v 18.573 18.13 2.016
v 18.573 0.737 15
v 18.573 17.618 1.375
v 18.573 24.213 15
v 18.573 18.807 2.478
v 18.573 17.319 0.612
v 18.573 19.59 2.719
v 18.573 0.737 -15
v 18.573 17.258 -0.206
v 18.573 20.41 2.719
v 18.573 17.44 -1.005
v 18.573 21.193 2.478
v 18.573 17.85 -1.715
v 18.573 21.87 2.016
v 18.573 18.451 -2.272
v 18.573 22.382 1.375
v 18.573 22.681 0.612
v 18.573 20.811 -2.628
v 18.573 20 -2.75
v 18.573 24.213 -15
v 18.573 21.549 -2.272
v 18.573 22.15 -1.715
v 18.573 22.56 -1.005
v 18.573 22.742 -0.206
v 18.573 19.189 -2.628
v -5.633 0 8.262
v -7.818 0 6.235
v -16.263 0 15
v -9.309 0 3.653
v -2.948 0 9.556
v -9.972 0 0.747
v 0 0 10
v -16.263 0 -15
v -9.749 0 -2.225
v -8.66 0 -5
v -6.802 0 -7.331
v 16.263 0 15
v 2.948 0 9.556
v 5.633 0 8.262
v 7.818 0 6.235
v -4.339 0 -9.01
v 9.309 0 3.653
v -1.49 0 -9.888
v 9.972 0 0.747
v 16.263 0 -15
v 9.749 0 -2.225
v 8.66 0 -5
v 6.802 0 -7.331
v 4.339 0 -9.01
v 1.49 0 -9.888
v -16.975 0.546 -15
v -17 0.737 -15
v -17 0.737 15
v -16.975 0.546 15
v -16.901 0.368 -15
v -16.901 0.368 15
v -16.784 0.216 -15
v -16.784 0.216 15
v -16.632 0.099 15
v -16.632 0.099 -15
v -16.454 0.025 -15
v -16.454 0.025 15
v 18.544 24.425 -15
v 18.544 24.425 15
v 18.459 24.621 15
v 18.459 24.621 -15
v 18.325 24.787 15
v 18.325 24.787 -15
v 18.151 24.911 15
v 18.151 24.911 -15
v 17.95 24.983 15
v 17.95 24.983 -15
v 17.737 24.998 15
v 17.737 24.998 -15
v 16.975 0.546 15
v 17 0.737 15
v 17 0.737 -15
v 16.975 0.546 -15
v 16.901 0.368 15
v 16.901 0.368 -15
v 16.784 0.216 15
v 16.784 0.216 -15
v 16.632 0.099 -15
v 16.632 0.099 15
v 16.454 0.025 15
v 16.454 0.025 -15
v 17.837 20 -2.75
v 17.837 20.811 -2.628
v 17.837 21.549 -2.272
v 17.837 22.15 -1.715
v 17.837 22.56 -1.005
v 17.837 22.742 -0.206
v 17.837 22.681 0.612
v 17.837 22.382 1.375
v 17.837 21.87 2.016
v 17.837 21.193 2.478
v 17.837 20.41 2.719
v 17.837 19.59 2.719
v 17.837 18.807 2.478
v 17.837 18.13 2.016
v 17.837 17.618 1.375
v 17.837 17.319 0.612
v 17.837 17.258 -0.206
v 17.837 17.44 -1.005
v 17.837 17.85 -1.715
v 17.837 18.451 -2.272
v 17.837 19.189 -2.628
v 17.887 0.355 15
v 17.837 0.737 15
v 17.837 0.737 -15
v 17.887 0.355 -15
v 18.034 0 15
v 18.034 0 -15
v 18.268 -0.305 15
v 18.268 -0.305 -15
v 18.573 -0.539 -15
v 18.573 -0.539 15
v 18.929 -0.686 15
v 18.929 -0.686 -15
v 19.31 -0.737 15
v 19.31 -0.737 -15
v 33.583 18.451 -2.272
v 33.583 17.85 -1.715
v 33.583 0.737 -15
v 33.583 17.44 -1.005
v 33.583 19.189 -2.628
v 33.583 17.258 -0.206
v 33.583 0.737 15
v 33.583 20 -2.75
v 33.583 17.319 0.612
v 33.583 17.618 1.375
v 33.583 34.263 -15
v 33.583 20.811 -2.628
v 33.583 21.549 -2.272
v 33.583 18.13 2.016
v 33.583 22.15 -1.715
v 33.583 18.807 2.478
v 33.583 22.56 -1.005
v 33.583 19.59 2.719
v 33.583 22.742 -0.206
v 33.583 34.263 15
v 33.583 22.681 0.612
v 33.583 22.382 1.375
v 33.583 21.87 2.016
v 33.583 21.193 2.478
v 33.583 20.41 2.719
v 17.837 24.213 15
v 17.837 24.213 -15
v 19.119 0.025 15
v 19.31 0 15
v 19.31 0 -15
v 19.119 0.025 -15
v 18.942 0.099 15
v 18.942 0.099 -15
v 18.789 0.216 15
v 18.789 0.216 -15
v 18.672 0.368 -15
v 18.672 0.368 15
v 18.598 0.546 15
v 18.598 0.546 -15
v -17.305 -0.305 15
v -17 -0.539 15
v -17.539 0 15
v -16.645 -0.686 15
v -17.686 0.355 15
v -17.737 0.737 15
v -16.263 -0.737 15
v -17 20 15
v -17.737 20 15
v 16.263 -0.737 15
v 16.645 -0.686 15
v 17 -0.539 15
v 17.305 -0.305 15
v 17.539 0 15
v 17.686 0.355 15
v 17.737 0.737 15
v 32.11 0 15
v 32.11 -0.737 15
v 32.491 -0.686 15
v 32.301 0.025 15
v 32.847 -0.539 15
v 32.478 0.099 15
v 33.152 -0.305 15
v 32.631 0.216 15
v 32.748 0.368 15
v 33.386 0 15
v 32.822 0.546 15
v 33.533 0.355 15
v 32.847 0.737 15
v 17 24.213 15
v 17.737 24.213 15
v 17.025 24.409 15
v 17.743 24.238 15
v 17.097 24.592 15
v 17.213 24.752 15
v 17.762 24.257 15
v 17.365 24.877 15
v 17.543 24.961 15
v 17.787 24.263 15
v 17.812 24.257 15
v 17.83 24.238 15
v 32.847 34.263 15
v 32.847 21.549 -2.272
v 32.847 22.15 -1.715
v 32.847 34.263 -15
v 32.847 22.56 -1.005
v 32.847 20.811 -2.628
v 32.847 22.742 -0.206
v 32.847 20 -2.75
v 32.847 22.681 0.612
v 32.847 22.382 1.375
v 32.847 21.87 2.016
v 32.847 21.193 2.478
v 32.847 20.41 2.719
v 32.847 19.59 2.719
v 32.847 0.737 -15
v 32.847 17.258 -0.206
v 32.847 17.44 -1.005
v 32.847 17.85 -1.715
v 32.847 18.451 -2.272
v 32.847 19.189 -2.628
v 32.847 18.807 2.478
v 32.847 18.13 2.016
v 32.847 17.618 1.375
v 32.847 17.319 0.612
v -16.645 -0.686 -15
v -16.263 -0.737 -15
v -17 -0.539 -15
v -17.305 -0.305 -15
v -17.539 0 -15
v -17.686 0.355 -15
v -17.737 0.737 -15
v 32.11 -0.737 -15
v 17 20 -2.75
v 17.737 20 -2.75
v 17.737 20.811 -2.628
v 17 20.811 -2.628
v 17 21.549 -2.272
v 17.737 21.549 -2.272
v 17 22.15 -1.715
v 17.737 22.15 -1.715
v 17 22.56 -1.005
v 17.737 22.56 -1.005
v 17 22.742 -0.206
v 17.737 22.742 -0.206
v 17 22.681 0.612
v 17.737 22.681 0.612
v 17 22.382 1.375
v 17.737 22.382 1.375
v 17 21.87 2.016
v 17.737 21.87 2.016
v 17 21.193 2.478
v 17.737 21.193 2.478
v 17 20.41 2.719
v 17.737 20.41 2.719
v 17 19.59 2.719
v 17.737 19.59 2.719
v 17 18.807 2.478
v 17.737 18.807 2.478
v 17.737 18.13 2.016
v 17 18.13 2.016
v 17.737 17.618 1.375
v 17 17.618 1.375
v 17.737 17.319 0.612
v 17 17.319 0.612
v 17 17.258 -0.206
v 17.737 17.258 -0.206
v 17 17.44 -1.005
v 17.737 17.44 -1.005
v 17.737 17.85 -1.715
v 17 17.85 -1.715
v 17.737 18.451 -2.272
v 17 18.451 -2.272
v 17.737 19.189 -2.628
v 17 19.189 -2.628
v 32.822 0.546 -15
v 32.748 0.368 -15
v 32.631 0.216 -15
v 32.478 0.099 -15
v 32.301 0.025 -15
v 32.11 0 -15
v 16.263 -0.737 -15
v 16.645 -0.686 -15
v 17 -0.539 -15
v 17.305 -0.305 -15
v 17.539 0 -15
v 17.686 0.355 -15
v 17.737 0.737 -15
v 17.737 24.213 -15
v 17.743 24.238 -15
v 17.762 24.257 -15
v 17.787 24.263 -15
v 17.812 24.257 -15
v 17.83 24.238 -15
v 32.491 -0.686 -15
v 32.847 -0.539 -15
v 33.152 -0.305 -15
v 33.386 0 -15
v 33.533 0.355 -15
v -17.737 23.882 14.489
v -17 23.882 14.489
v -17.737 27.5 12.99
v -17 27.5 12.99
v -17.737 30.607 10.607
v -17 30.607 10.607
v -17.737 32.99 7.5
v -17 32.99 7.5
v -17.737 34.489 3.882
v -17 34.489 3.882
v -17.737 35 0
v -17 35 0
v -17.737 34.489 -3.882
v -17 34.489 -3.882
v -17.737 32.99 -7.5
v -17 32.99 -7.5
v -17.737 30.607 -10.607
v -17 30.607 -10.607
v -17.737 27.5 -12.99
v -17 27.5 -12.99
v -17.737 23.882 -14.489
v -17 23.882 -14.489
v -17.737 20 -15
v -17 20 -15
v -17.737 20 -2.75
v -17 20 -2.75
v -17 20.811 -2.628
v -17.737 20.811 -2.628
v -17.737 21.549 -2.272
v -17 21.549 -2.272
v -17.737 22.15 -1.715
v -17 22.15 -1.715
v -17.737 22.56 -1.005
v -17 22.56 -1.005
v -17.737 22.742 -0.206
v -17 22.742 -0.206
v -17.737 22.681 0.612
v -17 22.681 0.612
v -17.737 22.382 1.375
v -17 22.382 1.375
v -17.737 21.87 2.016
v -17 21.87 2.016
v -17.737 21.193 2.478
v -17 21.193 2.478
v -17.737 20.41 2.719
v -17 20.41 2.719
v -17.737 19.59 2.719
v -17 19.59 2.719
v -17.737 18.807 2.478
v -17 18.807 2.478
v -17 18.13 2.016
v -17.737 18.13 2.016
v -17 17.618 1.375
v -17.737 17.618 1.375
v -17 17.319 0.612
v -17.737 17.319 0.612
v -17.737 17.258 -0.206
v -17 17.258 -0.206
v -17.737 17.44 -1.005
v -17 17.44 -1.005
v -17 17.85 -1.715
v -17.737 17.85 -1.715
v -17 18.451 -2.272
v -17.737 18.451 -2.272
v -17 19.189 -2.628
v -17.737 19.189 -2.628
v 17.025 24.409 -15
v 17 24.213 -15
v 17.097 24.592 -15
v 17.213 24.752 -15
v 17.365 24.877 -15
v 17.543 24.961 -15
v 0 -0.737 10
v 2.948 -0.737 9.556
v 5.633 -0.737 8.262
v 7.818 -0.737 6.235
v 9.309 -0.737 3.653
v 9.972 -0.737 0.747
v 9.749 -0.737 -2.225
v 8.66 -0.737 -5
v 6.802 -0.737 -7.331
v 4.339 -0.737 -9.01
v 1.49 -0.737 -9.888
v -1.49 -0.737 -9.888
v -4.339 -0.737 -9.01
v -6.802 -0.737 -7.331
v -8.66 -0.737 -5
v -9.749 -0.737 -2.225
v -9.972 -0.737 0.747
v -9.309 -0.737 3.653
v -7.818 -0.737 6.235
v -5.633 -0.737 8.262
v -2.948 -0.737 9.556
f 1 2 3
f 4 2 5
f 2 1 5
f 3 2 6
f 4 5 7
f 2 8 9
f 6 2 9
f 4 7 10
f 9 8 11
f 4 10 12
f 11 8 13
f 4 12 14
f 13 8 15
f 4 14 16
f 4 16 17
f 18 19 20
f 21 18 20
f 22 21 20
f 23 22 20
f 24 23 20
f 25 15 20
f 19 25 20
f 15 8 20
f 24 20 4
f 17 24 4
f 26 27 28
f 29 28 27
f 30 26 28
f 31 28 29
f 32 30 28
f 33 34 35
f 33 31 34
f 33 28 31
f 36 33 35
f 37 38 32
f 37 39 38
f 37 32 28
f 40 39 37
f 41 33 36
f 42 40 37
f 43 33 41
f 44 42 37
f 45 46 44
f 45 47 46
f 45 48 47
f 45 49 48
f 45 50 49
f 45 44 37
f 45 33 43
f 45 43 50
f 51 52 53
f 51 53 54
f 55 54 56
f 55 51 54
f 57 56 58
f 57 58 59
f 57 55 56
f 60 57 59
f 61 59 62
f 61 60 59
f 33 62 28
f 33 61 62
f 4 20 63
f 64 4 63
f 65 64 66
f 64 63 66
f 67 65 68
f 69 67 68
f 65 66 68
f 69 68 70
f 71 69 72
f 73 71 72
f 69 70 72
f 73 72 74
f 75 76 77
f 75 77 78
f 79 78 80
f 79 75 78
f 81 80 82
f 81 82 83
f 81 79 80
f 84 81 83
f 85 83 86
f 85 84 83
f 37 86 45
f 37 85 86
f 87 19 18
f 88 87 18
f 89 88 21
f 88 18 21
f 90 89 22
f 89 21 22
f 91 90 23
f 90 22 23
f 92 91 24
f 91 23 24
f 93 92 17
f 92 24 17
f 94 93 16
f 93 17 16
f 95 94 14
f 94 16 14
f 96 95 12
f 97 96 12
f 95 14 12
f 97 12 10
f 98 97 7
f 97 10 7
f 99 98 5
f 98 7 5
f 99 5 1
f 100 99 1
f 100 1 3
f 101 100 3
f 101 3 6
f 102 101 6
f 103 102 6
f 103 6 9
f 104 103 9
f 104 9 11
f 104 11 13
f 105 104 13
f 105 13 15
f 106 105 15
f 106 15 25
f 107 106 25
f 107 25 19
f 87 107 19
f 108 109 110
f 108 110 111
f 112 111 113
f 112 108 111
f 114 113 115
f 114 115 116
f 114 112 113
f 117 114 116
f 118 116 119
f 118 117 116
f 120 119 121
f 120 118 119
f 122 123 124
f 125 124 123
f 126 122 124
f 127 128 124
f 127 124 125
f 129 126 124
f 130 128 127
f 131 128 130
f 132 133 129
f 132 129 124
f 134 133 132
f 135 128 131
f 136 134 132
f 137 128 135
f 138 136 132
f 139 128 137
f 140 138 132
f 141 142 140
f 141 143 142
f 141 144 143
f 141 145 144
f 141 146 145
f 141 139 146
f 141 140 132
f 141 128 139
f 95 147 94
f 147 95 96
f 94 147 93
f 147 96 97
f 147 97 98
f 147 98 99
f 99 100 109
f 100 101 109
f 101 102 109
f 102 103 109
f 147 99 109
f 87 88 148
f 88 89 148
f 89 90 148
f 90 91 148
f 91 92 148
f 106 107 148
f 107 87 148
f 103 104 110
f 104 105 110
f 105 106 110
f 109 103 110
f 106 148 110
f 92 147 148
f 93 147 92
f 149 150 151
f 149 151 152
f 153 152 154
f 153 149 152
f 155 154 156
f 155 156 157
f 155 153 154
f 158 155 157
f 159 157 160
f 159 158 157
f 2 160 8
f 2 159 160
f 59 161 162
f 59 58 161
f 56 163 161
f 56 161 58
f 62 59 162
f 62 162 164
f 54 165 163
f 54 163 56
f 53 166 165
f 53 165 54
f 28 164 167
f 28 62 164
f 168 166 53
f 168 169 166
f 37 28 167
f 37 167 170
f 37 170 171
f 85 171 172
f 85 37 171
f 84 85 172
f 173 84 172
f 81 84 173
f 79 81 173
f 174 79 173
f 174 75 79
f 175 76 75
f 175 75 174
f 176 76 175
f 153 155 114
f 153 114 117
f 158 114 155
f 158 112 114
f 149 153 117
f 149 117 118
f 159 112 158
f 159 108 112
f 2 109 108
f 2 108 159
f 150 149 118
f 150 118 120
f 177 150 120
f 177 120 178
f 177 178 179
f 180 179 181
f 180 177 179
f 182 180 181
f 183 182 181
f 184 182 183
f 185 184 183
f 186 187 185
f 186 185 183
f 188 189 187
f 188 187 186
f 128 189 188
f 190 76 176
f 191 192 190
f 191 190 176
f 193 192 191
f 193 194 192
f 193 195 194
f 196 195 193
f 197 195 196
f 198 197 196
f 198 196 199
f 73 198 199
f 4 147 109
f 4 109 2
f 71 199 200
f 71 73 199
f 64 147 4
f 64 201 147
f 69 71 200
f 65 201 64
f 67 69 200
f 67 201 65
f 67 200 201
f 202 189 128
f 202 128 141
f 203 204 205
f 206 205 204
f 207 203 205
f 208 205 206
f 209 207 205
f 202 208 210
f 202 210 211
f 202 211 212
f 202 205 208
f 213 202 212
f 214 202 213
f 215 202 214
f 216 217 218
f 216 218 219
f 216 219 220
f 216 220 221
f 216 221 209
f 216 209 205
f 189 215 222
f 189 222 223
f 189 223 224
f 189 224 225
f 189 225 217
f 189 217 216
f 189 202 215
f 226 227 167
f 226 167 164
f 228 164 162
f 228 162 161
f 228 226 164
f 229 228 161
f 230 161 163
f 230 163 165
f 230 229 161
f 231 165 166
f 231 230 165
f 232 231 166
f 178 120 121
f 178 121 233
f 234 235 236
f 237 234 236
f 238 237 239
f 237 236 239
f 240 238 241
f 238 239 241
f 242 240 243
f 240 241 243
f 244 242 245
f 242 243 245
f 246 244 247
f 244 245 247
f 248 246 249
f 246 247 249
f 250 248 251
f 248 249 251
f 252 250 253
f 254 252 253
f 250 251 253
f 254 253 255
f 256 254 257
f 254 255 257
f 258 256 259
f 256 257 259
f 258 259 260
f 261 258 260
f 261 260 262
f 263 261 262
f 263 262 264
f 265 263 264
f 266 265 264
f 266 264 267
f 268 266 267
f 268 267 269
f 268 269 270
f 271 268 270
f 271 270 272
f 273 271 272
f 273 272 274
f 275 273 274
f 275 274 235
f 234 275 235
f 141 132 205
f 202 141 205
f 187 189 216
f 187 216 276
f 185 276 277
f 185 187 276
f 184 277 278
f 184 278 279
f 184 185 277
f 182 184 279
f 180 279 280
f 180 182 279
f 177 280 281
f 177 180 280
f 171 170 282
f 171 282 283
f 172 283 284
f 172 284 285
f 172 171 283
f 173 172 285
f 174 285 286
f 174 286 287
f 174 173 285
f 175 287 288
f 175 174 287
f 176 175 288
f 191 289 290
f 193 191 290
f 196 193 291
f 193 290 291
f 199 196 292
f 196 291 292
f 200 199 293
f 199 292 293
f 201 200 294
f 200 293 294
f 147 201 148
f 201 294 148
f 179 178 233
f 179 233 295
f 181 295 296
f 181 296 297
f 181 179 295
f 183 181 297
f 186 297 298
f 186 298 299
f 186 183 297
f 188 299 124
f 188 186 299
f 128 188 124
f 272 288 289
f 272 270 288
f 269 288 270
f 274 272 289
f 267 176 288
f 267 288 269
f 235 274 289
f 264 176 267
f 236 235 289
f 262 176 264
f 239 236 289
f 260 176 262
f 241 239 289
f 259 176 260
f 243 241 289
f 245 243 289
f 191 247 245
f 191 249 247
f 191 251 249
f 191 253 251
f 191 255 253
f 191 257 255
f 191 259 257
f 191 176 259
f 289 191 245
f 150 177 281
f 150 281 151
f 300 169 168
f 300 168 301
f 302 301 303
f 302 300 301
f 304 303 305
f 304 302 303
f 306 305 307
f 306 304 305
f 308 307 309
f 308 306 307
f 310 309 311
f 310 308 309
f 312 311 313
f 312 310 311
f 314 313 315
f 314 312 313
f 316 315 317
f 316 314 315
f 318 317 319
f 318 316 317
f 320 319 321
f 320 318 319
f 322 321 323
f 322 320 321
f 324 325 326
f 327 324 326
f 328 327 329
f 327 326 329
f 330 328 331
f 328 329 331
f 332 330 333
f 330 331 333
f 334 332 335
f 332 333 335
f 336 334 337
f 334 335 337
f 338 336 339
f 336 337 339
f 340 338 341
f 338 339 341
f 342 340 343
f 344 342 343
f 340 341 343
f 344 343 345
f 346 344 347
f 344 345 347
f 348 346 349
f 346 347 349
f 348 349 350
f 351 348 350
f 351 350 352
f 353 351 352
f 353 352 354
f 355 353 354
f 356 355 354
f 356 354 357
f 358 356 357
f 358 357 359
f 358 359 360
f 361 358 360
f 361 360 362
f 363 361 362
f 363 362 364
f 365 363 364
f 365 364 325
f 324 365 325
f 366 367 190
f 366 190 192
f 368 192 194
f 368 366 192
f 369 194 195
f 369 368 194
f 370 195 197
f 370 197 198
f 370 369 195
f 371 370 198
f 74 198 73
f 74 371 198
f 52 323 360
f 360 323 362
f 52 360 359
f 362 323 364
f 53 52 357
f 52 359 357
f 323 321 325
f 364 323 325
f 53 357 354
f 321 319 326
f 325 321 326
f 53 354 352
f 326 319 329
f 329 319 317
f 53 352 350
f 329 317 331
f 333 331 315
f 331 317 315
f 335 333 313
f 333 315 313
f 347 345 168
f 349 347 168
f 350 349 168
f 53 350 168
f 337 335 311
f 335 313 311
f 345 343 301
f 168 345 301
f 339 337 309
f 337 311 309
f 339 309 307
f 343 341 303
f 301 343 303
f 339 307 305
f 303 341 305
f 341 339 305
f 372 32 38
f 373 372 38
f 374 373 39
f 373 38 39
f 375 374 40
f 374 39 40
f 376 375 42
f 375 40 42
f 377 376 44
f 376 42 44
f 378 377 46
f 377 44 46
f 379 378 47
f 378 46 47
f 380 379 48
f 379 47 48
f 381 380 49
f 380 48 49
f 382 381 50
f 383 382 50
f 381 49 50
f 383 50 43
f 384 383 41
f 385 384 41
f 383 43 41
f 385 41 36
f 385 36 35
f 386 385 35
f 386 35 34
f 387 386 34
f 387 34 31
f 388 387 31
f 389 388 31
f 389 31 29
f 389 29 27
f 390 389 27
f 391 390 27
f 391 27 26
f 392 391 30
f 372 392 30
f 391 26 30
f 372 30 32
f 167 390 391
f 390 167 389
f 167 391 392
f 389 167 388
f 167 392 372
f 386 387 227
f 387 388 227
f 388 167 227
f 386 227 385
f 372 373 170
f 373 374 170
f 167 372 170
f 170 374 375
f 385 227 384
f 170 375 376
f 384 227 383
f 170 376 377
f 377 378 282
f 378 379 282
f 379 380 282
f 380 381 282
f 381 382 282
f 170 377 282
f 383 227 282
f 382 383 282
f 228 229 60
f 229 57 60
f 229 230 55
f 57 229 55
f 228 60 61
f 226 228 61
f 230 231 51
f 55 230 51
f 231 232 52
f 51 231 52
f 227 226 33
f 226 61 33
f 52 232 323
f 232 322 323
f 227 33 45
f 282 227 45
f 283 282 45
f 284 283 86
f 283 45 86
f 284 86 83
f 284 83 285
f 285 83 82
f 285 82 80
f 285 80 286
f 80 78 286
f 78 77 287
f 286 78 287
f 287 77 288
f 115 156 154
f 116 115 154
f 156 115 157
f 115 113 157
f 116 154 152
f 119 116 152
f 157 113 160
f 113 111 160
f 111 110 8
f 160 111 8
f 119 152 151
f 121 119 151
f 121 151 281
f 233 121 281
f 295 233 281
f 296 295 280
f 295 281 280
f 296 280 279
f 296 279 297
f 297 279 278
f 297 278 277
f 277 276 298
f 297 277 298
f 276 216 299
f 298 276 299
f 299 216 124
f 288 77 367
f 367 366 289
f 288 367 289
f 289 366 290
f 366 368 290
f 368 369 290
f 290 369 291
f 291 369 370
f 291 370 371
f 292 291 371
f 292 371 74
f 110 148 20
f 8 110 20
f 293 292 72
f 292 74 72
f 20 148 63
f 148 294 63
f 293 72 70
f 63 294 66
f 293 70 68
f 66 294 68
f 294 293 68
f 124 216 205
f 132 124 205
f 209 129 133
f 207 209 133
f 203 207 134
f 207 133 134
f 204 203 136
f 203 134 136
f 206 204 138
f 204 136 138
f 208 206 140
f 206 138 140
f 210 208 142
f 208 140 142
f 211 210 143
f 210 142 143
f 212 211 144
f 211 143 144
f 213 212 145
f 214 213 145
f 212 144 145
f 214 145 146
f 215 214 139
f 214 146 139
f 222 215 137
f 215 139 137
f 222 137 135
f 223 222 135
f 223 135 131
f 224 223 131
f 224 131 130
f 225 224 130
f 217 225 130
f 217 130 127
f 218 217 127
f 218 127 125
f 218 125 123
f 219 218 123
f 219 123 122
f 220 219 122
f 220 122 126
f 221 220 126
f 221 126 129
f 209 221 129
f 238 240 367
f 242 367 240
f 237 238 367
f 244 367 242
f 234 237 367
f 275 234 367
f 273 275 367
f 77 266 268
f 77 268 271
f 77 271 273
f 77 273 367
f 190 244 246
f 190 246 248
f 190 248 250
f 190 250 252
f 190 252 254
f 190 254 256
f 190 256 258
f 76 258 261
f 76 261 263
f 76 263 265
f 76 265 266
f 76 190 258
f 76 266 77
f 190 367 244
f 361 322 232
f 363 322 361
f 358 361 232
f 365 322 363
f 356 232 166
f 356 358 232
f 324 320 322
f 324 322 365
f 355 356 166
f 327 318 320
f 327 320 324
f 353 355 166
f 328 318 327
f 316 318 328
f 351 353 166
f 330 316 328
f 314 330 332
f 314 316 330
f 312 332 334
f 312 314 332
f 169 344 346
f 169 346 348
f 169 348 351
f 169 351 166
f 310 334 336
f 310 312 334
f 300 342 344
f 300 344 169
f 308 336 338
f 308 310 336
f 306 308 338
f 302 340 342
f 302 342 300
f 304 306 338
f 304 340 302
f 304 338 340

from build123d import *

# Parameters (mm, degrees)
SKETCH1_W                    = 34
SKETCH1_H                    = 30
SKETCH1_R                    = 10
BASE_FLANGE1_DEPTH           = 0.7366
EDGE_FLANGE1_STRIP_W         = 4.4196
EDGE_FLANGE1_STRIP_H         = 0.7366
EDGE_FLANGE1_STRIP_CUT_DEPTH = 30
EDGE_FLANGE1_DEPTH           = 30
EDGE_FLANGE2_STRIP_W         = 4.4196
EDGE_FLANGE2_STRIP_H         = 0.7366
EDGE_FLANGE2_STRIP_CUT_DEPTH = 30
EDGE_FLANGE2_DEPTH           = 30
EDGE_FLANGE2_START           = 0.7366
EDGE_FLANGE2_FLAT_DEPTH      = 0.7366
HEM1_START                   = -15
HEM1_DEPTH                   = 30
HEM1_2_DEPTH                 = 30
EDGE_FLANGE3_STRIP_W         = 4.4196
EDGE_FLANGE3_STRIP_H         = 0.7366
EDGE_FLANGE3_STRIP_CUT_DEPTH = 30
EDGE_FLANGE3_DEPTH           = 30
EDGE_FLANGE4_STRIP_W         = 4.4196
EDGE_FLANGE4_STRIP_H         = 0.7366
EDGE_FLANGE4_STRIP_CUT_DEPTH = 30
EDGE_FLANGE4_DEPTH           = 30
F_5_5_5_5_DIAMETER_HOLE1_D   = 5.5


# Read off the part's stored shape, not the designer's step: Hem1
# Sheet-metal steps are written as plain solids
with BuildPart() as part:
    # Sketch1 → Base-Flange1 (new body)
    with BuildSketch(Plane(origin=(0, 0, 0), x_dir=(1, 0, 0), z_dir=(0, 1, 0))):
        Rectangle(SKETCH1_W, SKETCH1_H)
        with Locations(Location((0, 0, 0), (0, 0, 270))):
            Circle(SKETCH1_R, mode=Mode.SUBTRACT)
    extrude(amount=-BASE_FLANGE1_DEPTH)

    # Edge-Flange1 strip (across the edge) → Edge-Flange1 strip cut (cut)
    with BuildSketch(Plane(origin=(17, 0, 15), x_dir=(-1, 0, 0), z_dir=(0, 0, -1))):
        with Locations((-1.4732, -0.3683)):
            Rectangle(EDGE_FLANGE1_STRIP_W, EDGE_FLANGE1_STRIP_H)
    extrude(amount=EDGE_FLANGE1_STRIP_CUT_DEPTH, mode=Mode.SUBTRACT)

    # Edge-Flange1 section (across the edge) → Edge-Flange1 (add)
    with BuildSketch(Plane(origin=(17, 0, 15), x_dir=(-1, 0, 0), z_dir=(0, 0, -1))):
        with BuildLine():
            Line((-0.7366, 0.7366), (-0.7366, 25))
            Line((-0.7366, 25), (0, 25))
            Line((0, 25), (0, 0.7366))
            ThreePointArc((0, 0.7366), (0.215745145, 0.215745145), (0.7366, 0))
            Line((0.7366, 0), (0.7366, -0.7366))
            ThreePointArc((0.7366, -0.7366), (-0.30510971, -0.30510971), (-0.7366, 0.7366))
        make_face()
    extrude(amount=EDGE_FLANGE1_DEPTH)

    # Edge-Flange2 strip (across the edge) → Edge-Flange2 strip cut (cut)
    with BuildSketch(Plane(origin=(-17, 0, -15), x_dir=(1, 0, 0), z_dir=(0, 0, 1))):
        with Locations((-1.4732, -0.3683)):
            Rectangle(EDGE_FLANGE2_STRIP_W, EDGE_FLANGE2_STRIP_H)
    extrude(amount=EDGE_FLANGE2_STRIP_CUT_DEPTH, mode=Mode.SUBTRACT)

    # Edge-Flange2 bend section (across the edge) → Edge-Flange2 (add)
    with BuildSketch(Plane(origin=(-17, 0, -15), x_dir=(1, 0, 0), z_dir=(0, 0, 1))):
        with BuildLine():
            Line((-0.7366, 0.7366), (0, 0.7366))
            ThreePointArc((0, 0.7366), (0.215745145, 0.215745145), (0.7366, 0))
            Line((0.7366, 0), (0.7366, -0.7366))
            ThreePointArc((0.7366, -0.7366), (-0.30510971, -0.30510971), (-0.7366, 0.7366))
        make_face()
    extrude(amount=EDGE_FLANGE2_DEPTH)

    # Edge-Flange2 profile (on flange) → Edge-Flange2 flat (add)
    with BuildSketch(Plane.ZY.offset(17).offset(EDGE_FLANGE2_START)):
        with BuildLine():
            ThreePointArc((15, 20), (0, 35), (-15, 20))
            Line((-15, 20), (-15, 0.7366))
            Line((-15, 0.7366), (15, 0.7366))
            Line((15, 0.7366), (15, 20))
        make_face()
    extrude(amount=-EDGE_FLANGE2_FLAT_DEPTH)

    # Hem1 outline → Hem1 (cut)
    with BuildSketch(Plane.XY.offset(HEM1_START)):
        with BuildLine():
            ThreePointArc((17, 24.2134), (17.212984467, 24.751642306), (17.7366, 24.998409274))
            Line((17.7366, 24.998409274), (17.7366, 25))
            Line((17.7366, 25), (17, 25))
            Line((17, 25), (17, 24.2134))
        make_face()
    extrude(amount=HEM1_DEPTH, mode=Mode.SUBTRACT)

    # Hem1 2 outline → Hem1 2 (add)
    with BuildSketch(Plane.XY.offset(HEM1_START)):
        with BuildLine():
            Line((17.8366, -0.7366), (18.5732, -0.7366))
            Line((18.5732, -0.7366), (18.5732, 24.2134))
            ThreePointArc((18.5732, 24.2134), (18.324842306, 24.787015533), (17.7366, 24.998409274))
            Line((17.7366, 24.998409274), (17.7366, 24.2134))
            ThreePointArc((17.7366, 24.2134), (17.7866, 24.2634), (17.8366, 24.2134))
            Line((17.8366, 24.2134), (17.8366, -0.7366))
        make_face()
    extrude(amount=HEM1_2_DEPTH)

    # Edge-Flange3 strip (across the edge) → Edge-Flange3 strip cut (cut)
    with BuildSketch(Plane(origin=(18.5732, -0.7366, 15), x_dir=(0, 1, 0), z_dir=(0, 0, -1))):
        with Locations((-0.7366, -0.3683)):
            Rectangle(EDGE_FLANGE3_STRIP_W, EDGE_FLANGE3_STRIP_H)
    extrude(amount=EDGE_FLANGE3_STRIP_CUT_DEPTH, mode=Mode.SUBTRACT)

    # Edge-Flange3 section (across the edge) → Edge-Flange3 (add)
    with BuildSketch(Plane(origin=(18.5732, -0.7366, 15), x_dir=(0, 1, 0), z_dir=(0, 0, -1))):
        with BuildLine():
            Line((0, 0.7366), (0, 14.2734))
            Line((0, 14.2734), (0.7366, 14.2734))
            Line((0.7366, 14.2734), (0.7366, 0.7366))
            ThreePointArc((0.7366, 0.7366), (0.952345145, 0.215745145), (1.4732, 0))
            Line((1.4732, 0), (1.4732, -0.7366))
            ThreePointArc((1.4732, -0.7366), (0.43149029, -0.30510971), (0, 0.7366))
        make_face()
    extrude(amount=EDGE_FLANGE3_DEPTH)

    # Edge-Flange4 strip (across the edge) → Edge-Flange4 strip cut (cut)
    with BuildSketch(Plane(origin=(32.8466, 0, 15), x_dir=(-1, 0, 0), z_dir=(0, 0, -1))):
        with Locations((-1.4732, -0.3683)):
            Rectangle(EDGE_FLANGE4_STRIP_W, EDGE_FLANGE4_STRIP_H)
    extrude(amount=EDGE_FLANGE4_STRIP_CUT_DEPTH, mode=Mode.SUBTRACT)

    # Edge-Flange4 section (across the edge) → Edge-Flange4 (add)
    with BuildSketch(Plane(origin=(32.8466, 0, 15), x_dir=(-1, 0, 0), z_dir=(0, 0, -1))):
        with BuildLine():
            Line((-0.7366, 0.7366), (-0.7366, 34.2634))
            Line((-0.7366, 34.2634), (0, 34.2634))
            Line((0, 34.2634), (0, 0.7366))
            ThreePointArc((0, 0.7366), (0.215745145, 0.215745145), (0.7366, 0))
            Line((0.7366, 0), (0.7366, -0.7366))
            ThreePointArc((0.7366, -0.7366), (-0.30510971, -0.30510971), (-0.7366, 0.7366))
        make_face()
    extrude(amount=EDGE_FLANGE4_DEPTH)

    # Ø5.5 (5.5) Diameter Hole1 (through all)
    with Locations(Plane.ZY.offset(17.7366)):
        with Locations((0, 20)):
            Hole(F_5_5_5_5_DIAMETER_HOLE1_D / 2)


solid = part.part
